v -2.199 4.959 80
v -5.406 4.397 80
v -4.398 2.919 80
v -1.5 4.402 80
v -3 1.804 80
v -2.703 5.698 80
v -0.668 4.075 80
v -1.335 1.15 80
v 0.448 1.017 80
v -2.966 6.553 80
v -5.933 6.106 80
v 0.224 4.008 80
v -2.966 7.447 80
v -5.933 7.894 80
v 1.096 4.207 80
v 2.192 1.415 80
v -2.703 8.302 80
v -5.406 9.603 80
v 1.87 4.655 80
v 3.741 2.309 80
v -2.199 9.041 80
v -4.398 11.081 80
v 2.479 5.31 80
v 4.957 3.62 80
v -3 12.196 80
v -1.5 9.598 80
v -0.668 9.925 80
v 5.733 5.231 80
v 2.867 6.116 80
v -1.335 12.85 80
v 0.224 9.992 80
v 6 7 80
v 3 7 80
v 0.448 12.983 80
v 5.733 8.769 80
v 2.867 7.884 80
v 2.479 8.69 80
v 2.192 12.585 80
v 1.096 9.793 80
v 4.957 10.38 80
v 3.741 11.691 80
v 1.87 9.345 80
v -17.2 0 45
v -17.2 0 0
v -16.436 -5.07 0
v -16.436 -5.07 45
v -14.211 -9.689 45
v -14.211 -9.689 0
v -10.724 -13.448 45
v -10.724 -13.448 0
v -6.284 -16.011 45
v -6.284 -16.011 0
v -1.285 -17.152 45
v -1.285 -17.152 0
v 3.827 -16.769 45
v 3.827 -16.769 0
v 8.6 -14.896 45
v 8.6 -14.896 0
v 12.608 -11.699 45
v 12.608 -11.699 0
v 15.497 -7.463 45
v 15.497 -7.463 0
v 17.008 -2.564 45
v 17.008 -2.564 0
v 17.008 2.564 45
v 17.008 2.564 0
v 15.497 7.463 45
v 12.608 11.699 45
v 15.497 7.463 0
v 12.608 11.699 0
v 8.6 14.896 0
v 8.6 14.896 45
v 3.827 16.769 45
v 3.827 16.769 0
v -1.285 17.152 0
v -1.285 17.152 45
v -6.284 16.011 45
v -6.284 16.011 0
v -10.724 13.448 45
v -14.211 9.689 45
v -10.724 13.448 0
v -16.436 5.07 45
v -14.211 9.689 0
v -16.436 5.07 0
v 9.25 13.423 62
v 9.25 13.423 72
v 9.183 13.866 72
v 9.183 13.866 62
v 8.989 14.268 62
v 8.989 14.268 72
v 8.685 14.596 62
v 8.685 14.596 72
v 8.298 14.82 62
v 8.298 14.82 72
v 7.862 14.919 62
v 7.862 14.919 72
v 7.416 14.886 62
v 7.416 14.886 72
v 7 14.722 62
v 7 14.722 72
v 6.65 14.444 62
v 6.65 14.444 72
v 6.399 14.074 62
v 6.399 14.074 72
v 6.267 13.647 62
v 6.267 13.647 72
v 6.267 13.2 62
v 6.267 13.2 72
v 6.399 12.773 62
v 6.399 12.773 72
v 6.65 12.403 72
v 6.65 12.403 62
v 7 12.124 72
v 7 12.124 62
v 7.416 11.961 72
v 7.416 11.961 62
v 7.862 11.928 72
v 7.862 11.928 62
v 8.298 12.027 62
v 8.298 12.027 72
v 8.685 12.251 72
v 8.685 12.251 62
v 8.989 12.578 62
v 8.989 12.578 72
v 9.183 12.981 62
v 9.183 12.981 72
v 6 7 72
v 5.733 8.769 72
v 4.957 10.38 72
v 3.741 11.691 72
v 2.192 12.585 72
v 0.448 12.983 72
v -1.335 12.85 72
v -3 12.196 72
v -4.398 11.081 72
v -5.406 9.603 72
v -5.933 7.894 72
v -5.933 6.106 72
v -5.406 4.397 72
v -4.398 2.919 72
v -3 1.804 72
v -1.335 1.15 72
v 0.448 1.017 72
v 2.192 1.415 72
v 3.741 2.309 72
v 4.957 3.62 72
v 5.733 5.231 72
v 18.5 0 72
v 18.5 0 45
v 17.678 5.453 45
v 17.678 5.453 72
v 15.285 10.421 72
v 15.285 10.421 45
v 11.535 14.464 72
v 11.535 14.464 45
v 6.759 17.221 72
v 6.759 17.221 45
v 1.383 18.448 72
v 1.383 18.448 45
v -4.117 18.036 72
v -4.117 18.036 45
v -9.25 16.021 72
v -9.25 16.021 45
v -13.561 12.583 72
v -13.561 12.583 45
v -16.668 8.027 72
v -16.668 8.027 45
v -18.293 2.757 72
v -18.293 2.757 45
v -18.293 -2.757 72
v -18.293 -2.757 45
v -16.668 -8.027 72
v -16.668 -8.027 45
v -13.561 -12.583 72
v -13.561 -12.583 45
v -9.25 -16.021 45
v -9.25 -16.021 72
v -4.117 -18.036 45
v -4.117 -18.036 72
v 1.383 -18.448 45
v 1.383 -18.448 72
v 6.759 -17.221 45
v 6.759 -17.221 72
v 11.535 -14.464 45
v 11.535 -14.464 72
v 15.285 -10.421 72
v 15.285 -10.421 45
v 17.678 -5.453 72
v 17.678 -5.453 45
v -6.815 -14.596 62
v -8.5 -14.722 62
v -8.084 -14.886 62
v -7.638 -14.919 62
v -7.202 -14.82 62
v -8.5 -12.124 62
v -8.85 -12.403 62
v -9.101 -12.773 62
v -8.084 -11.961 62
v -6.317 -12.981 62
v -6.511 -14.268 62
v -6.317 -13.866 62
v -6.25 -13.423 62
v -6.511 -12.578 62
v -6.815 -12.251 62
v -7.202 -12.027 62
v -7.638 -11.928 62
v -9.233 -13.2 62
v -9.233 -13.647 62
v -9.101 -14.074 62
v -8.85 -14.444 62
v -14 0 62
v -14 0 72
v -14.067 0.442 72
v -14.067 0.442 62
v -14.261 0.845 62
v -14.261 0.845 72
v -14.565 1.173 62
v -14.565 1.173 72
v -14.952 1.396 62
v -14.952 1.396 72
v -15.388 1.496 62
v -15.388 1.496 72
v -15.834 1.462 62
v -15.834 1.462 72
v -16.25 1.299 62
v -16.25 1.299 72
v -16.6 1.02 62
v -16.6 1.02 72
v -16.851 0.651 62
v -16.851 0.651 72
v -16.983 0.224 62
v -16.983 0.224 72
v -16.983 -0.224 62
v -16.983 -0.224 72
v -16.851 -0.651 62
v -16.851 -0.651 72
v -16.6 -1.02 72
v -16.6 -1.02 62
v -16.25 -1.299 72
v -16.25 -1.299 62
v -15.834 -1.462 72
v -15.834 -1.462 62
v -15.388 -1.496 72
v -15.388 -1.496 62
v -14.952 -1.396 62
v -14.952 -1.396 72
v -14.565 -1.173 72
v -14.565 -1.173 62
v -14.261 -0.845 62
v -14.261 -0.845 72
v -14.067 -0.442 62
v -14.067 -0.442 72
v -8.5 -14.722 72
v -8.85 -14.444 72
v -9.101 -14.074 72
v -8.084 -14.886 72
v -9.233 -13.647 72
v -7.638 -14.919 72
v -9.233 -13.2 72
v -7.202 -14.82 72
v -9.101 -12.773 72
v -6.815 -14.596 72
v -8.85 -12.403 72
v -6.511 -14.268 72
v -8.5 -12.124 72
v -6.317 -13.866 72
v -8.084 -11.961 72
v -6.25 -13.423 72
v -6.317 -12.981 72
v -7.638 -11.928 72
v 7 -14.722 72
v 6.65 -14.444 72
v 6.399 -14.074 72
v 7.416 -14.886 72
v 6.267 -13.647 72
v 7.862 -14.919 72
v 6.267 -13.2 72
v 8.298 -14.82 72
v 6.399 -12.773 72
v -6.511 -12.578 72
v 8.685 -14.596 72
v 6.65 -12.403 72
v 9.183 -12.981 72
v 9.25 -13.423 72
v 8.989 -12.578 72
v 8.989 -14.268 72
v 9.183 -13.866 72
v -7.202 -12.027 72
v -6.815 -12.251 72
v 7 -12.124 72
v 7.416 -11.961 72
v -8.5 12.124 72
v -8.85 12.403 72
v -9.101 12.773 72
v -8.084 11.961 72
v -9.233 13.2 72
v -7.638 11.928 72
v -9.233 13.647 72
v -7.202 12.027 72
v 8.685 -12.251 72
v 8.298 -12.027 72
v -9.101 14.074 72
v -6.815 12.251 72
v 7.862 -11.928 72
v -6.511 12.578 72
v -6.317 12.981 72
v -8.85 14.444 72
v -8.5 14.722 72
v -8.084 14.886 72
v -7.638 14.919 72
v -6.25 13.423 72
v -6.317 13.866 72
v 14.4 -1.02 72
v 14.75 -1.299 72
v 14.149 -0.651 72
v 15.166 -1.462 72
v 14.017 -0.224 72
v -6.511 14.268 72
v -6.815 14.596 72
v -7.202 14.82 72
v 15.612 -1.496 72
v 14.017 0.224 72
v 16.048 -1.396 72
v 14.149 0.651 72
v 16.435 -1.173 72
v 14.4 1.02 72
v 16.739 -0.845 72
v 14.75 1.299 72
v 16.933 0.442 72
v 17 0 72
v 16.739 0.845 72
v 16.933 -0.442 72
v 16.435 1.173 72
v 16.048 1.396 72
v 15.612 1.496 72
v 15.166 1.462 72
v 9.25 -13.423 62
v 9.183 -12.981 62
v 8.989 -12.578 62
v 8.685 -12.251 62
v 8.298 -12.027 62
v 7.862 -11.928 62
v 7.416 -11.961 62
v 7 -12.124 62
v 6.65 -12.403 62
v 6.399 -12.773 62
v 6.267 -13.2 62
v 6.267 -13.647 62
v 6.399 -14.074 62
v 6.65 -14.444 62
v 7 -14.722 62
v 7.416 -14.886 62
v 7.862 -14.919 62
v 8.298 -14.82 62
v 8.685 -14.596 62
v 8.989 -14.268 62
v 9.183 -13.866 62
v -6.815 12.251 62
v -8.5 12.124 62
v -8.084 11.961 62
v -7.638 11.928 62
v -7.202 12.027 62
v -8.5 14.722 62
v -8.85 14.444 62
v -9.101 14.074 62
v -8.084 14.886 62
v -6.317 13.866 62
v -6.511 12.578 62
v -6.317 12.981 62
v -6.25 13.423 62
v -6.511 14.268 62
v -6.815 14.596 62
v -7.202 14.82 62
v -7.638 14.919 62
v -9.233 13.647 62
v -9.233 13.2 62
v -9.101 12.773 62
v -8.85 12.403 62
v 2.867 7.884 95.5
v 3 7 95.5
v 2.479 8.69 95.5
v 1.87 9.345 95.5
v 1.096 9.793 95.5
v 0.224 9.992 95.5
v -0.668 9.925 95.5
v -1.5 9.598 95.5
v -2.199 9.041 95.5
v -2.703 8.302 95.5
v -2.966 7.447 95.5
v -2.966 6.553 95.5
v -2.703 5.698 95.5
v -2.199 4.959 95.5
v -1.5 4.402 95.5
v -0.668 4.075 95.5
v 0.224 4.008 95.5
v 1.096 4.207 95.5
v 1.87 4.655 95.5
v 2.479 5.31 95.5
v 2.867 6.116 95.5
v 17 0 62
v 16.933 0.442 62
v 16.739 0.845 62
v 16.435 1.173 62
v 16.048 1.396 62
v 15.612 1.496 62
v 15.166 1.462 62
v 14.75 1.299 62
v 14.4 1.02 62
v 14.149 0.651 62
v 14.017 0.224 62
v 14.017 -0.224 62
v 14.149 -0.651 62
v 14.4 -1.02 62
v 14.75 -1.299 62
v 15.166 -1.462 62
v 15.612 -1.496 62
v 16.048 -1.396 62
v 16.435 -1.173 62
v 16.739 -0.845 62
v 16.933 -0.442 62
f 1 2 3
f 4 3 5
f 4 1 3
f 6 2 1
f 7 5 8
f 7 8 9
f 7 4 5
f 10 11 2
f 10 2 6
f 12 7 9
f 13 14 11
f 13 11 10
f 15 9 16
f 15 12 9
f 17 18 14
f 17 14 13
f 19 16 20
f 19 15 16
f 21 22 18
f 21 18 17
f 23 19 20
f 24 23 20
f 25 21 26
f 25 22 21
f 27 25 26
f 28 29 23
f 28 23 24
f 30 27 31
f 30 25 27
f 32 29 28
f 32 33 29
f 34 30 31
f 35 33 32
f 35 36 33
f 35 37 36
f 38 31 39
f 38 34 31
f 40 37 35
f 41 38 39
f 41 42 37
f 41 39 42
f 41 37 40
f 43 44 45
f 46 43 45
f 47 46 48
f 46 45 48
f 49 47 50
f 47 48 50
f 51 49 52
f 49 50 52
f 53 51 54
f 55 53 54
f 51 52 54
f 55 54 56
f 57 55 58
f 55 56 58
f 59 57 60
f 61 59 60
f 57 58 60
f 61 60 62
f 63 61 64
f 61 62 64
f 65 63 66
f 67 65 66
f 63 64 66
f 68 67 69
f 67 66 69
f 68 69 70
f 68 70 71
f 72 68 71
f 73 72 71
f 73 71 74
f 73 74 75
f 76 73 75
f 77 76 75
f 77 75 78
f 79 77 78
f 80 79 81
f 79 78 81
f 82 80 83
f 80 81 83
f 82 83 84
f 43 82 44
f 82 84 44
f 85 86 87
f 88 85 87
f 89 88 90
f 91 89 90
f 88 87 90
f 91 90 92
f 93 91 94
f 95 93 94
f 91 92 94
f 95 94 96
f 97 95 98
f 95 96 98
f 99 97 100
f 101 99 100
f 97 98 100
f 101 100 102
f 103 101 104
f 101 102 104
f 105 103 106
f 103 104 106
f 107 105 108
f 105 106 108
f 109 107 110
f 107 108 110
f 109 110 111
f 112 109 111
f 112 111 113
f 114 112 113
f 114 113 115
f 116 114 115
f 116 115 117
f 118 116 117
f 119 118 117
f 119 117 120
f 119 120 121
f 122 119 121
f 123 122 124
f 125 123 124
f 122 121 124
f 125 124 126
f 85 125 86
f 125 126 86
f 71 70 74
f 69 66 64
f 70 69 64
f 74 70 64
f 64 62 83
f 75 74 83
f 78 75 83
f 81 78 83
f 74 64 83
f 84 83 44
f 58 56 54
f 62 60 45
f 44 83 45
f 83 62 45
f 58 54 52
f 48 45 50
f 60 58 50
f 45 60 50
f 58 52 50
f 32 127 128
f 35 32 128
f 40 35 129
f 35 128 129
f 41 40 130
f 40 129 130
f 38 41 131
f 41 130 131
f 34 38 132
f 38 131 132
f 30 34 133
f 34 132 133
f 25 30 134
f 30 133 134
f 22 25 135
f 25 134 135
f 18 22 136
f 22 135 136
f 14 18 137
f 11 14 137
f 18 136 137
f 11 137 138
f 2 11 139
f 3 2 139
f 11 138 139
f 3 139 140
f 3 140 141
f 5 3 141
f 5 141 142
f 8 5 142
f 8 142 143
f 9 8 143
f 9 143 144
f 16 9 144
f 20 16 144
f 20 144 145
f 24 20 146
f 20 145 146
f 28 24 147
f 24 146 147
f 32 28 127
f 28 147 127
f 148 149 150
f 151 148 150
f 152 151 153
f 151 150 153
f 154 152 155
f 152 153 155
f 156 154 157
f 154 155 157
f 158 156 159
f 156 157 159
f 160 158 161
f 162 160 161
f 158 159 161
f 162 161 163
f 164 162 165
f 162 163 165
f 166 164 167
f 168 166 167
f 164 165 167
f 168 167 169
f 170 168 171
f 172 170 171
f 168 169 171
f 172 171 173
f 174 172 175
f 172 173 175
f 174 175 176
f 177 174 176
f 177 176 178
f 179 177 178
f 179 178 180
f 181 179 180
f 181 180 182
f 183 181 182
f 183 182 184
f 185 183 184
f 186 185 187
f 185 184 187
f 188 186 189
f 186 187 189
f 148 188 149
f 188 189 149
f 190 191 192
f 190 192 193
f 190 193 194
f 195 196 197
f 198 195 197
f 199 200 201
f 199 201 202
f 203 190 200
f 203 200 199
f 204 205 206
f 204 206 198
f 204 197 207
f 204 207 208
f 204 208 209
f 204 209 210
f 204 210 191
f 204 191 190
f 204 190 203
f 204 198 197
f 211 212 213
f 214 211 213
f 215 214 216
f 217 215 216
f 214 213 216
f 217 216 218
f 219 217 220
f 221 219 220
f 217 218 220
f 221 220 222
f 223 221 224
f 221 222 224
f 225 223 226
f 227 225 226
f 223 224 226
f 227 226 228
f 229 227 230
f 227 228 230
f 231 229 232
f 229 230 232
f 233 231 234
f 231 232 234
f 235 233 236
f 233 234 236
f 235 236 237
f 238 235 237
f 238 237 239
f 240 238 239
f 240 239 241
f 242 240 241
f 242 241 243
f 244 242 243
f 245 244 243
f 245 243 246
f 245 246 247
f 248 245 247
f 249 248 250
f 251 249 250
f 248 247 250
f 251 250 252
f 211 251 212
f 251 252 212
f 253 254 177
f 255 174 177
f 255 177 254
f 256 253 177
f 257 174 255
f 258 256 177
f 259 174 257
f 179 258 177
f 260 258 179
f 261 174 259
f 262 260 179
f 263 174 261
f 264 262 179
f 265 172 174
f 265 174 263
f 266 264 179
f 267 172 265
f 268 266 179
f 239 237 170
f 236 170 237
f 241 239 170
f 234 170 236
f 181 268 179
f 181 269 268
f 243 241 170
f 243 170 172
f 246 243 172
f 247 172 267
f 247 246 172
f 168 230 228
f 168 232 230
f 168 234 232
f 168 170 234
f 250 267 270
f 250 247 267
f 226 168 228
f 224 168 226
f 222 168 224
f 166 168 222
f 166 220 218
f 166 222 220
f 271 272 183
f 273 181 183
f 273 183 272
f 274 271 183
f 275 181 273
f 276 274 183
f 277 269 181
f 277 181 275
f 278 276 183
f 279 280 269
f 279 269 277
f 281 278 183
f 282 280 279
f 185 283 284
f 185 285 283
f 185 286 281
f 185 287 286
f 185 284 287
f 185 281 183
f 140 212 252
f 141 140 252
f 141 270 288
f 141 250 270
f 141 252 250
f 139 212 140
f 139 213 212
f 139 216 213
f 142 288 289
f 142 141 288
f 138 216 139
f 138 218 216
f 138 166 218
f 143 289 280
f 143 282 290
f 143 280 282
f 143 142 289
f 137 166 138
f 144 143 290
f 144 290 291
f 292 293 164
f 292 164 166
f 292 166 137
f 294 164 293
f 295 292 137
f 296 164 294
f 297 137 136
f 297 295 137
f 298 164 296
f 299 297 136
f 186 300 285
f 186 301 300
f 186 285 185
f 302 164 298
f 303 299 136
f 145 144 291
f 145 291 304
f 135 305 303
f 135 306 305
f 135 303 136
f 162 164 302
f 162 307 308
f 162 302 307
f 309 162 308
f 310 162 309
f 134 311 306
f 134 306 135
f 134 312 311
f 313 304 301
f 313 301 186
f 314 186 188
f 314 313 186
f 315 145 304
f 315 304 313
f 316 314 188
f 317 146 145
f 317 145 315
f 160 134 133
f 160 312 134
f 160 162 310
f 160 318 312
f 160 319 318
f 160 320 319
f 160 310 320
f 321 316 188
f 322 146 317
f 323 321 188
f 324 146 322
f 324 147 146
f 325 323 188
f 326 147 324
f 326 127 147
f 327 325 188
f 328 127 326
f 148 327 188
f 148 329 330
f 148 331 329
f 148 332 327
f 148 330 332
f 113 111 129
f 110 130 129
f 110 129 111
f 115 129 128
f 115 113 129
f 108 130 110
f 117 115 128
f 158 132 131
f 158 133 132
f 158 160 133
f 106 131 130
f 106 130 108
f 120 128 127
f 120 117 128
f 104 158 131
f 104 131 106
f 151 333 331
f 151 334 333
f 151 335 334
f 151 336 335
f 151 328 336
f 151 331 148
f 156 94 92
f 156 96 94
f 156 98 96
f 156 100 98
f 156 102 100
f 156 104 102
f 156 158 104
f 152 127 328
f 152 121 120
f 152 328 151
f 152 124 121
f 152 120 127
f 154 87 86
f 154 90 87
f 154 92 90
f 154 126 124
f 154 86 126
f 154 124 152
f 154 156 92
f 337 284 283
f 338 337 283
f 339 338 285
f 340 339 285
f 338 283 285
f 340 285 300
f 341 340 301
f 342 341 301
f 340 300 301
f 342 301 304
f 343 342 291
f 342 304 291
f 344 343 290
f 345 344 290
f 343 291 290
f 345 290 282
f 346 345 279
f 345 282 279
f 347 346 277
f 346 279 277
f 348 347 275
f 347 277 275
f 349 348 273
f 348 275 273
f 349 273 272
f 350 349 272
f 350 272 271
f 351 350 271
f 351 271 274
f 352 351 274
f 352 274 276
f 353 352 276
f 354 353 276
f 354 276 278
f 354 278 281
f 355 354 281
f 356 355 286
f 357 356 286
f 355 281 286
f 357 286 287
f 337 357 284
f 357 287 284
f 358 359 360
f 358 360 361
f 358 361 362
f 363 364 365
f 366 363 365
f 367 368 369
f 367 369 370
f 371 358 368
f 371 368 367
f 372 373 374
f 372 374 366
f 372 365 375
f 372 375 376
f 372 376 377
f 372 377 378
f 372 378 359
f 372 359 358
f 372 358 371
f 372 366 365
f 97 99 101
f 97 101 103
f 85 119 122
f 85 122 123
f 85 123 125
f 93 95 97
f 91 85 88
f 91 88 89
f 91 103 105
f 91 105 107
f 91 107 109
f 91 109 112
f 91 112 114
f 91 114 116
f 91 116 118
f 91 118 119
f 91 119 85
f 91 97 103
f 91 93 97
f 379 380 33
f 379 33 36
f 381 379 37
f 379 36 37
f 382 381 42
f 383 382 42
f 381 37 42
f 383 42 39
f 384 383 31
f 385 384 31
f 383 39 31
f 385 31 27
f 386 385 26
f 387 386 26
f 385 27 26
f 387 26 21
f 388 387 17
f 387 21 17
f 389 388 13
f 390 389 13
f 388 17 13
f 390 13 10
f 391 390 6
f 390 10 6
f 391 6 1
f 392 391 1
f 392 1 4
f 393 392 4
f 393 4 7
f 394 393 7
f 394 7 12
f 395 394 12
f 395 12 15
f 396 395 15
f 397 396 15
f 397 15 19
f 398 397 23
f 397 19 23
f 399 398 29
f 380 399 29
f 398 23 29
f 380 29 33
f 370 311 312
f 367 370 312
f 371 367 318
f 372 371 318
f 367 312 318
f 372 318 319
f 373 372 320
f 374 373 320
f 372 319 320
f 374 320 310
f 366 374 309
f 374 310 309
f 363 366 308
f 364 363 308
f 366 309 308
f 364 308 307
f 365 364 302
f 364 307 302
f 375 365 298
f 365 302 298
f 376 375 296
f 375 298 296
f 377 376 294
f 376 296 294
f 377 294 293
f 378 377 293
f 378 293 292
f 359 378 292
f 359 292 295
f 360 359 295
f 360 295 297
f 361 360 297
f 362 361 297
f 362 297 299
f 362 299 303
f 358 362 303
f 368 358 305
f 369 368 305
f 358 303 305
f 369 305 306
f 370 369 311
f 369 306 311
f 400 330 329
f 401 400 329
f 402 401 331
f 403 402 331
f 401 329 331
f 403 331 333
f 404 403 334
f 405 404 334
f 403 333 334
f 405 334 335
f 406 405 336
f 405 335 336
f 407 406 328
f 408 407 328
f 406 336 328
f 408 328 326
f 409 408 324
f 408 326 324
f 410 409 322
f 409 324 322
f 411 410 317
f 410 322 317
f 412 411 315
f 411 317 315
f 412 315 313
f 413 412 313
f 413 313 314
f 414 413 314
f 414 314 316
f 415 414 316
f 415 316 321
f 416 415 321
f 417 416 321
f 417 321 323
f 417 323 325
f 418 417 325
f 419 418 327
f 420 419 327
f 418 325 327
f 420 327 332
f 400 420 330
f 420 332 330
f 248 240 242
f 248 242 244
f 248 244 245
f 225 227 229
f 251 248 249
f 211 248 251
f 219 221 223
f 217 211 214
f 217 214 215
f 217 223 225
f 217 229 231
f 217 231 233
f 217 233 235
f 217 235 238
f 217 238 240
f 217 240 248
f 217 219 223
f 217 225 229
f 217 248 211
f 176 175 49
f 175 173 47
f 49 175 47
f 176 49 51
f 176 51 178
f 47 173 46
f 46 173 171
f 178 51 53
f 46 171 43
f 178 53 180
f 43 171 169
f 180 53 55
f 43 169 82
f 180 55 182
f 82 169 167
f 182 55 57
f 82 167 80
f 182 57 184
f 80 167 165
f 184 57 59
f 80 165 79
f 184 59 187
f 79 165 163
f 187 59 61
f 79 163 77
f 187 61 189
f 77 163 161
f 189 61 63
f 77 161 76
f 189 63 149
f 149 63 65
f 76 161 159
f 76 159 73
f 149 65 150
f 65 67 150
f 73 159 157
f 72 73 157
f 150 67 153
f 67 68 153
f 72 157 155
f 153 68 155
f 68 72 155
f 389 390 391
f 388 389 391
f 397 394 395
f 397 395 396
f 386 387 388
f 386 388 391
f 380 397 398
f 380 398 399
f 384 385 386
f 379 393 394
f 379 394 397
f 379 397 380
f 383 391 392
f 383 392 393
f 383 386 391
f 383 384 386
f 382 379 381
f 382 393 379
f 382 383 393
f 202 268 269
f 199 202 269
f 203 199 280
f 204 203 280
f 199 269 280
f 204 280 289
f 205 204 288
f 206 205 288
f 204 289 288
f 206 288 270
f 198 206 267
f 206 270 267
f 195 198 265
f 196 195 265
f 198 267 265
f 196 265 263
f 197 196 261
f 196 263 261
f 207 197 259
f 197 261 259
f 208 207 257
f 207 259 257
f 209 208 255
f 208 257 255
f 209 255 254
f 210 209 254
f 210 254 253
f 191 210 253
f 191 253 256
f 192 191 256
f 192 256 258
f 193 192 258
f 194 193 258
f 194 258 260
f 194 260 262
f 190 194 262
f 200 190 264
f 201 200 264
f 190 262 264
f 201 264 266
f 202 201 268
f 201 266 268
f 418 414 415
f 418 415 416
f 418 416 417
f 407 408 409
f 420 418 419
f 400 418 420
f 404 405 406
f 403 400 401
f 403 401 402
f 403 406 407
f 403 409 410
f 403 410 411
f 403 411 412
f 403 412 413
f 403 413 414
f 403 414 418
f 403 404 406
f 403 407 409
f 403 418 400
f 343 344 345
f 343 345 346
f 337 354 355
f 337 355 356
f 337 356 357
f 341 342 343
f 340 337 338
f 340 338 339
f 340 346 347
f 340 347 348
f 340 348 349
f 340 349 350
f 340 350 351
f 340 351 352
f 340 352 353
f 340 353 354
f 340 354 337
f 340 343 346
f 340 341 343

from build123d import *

# Parameters (mm, degrees)
SKETCH_1_R          = 17.2
EXTRUDE_1_DEPTH     = 45
SKETCH_2_R          = 18.5
EXTRUDE_2_DEPTH     = 27
SKETCH_6_R          = 1.5
CUT_EXTRUDE_1_DEPTH = 10
SKETCH_3_R          = 6
EXTRUDE_3_DEPTH     = 8
SKETCH_4_R          = 3
EXTRUDE_4_DEPTH     = 15.5


with BuildPart() as part:
    # 草图1 → 凸台-拉伸1 (new body)
    with BuildSketch(Plane.XY):
        with Locations(Location((0, 0, 0), (0, 0, 180))):
            Circle(SKETCH_1_R)
    extrude(amount=EXTRUDE_1_DEPTH)

    # 草图2 → 凸台-拉伸2 (add)
    with BuildSketch(Plane.XY.offset(45)):
        Circle(SKETCH_2_R)
    extrude(amount=EXTRUDE_2_DEPTH)

    # 草图6 → 切除-拉伸1 (cut)
    with BuildSketch(Plane.XY.offset(72)):
        with Locations((-15.5, 0)):
            Circle(SKETCH_6_R)
        with Locations((-7.75, 13.423393759)):
            Circle(SKETCH_6_R)
        with Locations((7.75, 13.423393759)):
            Circle(SKETCH_6_R)
        with Locations((15.5, 0)):
            Circle(SKETCH_6_R)
        with Locations((7.75, -13.423393759)):
            Circle(SKETCH_6_R)
        with Locations((-7.75, -13.423393759)):
            Circle(SKETCH_6_R)
    extrude(amount=-CUT_EXTRUDE_1_DEPTH, mode=Mode.SUBTRACT)

    # 草图3 → 凸台-拉伸3 (add)
    with BuildSketch(Plane.XY.offset(72)):
        with Locations((0, 7)):
            Circle(SKETCH_3_R)
    extrude(amount=EXTRUDE_3_DEPTH)

    # 草图4 → 凸台-拉伸4 (add)
    with BuildSketch(Plane.XY.offset(80)):
        with Locations((0, 7)):
            Circle(SKETCH_4_R)
    extrude(amount=EXTRUDE_4_DEPTH)


solid = part.part
